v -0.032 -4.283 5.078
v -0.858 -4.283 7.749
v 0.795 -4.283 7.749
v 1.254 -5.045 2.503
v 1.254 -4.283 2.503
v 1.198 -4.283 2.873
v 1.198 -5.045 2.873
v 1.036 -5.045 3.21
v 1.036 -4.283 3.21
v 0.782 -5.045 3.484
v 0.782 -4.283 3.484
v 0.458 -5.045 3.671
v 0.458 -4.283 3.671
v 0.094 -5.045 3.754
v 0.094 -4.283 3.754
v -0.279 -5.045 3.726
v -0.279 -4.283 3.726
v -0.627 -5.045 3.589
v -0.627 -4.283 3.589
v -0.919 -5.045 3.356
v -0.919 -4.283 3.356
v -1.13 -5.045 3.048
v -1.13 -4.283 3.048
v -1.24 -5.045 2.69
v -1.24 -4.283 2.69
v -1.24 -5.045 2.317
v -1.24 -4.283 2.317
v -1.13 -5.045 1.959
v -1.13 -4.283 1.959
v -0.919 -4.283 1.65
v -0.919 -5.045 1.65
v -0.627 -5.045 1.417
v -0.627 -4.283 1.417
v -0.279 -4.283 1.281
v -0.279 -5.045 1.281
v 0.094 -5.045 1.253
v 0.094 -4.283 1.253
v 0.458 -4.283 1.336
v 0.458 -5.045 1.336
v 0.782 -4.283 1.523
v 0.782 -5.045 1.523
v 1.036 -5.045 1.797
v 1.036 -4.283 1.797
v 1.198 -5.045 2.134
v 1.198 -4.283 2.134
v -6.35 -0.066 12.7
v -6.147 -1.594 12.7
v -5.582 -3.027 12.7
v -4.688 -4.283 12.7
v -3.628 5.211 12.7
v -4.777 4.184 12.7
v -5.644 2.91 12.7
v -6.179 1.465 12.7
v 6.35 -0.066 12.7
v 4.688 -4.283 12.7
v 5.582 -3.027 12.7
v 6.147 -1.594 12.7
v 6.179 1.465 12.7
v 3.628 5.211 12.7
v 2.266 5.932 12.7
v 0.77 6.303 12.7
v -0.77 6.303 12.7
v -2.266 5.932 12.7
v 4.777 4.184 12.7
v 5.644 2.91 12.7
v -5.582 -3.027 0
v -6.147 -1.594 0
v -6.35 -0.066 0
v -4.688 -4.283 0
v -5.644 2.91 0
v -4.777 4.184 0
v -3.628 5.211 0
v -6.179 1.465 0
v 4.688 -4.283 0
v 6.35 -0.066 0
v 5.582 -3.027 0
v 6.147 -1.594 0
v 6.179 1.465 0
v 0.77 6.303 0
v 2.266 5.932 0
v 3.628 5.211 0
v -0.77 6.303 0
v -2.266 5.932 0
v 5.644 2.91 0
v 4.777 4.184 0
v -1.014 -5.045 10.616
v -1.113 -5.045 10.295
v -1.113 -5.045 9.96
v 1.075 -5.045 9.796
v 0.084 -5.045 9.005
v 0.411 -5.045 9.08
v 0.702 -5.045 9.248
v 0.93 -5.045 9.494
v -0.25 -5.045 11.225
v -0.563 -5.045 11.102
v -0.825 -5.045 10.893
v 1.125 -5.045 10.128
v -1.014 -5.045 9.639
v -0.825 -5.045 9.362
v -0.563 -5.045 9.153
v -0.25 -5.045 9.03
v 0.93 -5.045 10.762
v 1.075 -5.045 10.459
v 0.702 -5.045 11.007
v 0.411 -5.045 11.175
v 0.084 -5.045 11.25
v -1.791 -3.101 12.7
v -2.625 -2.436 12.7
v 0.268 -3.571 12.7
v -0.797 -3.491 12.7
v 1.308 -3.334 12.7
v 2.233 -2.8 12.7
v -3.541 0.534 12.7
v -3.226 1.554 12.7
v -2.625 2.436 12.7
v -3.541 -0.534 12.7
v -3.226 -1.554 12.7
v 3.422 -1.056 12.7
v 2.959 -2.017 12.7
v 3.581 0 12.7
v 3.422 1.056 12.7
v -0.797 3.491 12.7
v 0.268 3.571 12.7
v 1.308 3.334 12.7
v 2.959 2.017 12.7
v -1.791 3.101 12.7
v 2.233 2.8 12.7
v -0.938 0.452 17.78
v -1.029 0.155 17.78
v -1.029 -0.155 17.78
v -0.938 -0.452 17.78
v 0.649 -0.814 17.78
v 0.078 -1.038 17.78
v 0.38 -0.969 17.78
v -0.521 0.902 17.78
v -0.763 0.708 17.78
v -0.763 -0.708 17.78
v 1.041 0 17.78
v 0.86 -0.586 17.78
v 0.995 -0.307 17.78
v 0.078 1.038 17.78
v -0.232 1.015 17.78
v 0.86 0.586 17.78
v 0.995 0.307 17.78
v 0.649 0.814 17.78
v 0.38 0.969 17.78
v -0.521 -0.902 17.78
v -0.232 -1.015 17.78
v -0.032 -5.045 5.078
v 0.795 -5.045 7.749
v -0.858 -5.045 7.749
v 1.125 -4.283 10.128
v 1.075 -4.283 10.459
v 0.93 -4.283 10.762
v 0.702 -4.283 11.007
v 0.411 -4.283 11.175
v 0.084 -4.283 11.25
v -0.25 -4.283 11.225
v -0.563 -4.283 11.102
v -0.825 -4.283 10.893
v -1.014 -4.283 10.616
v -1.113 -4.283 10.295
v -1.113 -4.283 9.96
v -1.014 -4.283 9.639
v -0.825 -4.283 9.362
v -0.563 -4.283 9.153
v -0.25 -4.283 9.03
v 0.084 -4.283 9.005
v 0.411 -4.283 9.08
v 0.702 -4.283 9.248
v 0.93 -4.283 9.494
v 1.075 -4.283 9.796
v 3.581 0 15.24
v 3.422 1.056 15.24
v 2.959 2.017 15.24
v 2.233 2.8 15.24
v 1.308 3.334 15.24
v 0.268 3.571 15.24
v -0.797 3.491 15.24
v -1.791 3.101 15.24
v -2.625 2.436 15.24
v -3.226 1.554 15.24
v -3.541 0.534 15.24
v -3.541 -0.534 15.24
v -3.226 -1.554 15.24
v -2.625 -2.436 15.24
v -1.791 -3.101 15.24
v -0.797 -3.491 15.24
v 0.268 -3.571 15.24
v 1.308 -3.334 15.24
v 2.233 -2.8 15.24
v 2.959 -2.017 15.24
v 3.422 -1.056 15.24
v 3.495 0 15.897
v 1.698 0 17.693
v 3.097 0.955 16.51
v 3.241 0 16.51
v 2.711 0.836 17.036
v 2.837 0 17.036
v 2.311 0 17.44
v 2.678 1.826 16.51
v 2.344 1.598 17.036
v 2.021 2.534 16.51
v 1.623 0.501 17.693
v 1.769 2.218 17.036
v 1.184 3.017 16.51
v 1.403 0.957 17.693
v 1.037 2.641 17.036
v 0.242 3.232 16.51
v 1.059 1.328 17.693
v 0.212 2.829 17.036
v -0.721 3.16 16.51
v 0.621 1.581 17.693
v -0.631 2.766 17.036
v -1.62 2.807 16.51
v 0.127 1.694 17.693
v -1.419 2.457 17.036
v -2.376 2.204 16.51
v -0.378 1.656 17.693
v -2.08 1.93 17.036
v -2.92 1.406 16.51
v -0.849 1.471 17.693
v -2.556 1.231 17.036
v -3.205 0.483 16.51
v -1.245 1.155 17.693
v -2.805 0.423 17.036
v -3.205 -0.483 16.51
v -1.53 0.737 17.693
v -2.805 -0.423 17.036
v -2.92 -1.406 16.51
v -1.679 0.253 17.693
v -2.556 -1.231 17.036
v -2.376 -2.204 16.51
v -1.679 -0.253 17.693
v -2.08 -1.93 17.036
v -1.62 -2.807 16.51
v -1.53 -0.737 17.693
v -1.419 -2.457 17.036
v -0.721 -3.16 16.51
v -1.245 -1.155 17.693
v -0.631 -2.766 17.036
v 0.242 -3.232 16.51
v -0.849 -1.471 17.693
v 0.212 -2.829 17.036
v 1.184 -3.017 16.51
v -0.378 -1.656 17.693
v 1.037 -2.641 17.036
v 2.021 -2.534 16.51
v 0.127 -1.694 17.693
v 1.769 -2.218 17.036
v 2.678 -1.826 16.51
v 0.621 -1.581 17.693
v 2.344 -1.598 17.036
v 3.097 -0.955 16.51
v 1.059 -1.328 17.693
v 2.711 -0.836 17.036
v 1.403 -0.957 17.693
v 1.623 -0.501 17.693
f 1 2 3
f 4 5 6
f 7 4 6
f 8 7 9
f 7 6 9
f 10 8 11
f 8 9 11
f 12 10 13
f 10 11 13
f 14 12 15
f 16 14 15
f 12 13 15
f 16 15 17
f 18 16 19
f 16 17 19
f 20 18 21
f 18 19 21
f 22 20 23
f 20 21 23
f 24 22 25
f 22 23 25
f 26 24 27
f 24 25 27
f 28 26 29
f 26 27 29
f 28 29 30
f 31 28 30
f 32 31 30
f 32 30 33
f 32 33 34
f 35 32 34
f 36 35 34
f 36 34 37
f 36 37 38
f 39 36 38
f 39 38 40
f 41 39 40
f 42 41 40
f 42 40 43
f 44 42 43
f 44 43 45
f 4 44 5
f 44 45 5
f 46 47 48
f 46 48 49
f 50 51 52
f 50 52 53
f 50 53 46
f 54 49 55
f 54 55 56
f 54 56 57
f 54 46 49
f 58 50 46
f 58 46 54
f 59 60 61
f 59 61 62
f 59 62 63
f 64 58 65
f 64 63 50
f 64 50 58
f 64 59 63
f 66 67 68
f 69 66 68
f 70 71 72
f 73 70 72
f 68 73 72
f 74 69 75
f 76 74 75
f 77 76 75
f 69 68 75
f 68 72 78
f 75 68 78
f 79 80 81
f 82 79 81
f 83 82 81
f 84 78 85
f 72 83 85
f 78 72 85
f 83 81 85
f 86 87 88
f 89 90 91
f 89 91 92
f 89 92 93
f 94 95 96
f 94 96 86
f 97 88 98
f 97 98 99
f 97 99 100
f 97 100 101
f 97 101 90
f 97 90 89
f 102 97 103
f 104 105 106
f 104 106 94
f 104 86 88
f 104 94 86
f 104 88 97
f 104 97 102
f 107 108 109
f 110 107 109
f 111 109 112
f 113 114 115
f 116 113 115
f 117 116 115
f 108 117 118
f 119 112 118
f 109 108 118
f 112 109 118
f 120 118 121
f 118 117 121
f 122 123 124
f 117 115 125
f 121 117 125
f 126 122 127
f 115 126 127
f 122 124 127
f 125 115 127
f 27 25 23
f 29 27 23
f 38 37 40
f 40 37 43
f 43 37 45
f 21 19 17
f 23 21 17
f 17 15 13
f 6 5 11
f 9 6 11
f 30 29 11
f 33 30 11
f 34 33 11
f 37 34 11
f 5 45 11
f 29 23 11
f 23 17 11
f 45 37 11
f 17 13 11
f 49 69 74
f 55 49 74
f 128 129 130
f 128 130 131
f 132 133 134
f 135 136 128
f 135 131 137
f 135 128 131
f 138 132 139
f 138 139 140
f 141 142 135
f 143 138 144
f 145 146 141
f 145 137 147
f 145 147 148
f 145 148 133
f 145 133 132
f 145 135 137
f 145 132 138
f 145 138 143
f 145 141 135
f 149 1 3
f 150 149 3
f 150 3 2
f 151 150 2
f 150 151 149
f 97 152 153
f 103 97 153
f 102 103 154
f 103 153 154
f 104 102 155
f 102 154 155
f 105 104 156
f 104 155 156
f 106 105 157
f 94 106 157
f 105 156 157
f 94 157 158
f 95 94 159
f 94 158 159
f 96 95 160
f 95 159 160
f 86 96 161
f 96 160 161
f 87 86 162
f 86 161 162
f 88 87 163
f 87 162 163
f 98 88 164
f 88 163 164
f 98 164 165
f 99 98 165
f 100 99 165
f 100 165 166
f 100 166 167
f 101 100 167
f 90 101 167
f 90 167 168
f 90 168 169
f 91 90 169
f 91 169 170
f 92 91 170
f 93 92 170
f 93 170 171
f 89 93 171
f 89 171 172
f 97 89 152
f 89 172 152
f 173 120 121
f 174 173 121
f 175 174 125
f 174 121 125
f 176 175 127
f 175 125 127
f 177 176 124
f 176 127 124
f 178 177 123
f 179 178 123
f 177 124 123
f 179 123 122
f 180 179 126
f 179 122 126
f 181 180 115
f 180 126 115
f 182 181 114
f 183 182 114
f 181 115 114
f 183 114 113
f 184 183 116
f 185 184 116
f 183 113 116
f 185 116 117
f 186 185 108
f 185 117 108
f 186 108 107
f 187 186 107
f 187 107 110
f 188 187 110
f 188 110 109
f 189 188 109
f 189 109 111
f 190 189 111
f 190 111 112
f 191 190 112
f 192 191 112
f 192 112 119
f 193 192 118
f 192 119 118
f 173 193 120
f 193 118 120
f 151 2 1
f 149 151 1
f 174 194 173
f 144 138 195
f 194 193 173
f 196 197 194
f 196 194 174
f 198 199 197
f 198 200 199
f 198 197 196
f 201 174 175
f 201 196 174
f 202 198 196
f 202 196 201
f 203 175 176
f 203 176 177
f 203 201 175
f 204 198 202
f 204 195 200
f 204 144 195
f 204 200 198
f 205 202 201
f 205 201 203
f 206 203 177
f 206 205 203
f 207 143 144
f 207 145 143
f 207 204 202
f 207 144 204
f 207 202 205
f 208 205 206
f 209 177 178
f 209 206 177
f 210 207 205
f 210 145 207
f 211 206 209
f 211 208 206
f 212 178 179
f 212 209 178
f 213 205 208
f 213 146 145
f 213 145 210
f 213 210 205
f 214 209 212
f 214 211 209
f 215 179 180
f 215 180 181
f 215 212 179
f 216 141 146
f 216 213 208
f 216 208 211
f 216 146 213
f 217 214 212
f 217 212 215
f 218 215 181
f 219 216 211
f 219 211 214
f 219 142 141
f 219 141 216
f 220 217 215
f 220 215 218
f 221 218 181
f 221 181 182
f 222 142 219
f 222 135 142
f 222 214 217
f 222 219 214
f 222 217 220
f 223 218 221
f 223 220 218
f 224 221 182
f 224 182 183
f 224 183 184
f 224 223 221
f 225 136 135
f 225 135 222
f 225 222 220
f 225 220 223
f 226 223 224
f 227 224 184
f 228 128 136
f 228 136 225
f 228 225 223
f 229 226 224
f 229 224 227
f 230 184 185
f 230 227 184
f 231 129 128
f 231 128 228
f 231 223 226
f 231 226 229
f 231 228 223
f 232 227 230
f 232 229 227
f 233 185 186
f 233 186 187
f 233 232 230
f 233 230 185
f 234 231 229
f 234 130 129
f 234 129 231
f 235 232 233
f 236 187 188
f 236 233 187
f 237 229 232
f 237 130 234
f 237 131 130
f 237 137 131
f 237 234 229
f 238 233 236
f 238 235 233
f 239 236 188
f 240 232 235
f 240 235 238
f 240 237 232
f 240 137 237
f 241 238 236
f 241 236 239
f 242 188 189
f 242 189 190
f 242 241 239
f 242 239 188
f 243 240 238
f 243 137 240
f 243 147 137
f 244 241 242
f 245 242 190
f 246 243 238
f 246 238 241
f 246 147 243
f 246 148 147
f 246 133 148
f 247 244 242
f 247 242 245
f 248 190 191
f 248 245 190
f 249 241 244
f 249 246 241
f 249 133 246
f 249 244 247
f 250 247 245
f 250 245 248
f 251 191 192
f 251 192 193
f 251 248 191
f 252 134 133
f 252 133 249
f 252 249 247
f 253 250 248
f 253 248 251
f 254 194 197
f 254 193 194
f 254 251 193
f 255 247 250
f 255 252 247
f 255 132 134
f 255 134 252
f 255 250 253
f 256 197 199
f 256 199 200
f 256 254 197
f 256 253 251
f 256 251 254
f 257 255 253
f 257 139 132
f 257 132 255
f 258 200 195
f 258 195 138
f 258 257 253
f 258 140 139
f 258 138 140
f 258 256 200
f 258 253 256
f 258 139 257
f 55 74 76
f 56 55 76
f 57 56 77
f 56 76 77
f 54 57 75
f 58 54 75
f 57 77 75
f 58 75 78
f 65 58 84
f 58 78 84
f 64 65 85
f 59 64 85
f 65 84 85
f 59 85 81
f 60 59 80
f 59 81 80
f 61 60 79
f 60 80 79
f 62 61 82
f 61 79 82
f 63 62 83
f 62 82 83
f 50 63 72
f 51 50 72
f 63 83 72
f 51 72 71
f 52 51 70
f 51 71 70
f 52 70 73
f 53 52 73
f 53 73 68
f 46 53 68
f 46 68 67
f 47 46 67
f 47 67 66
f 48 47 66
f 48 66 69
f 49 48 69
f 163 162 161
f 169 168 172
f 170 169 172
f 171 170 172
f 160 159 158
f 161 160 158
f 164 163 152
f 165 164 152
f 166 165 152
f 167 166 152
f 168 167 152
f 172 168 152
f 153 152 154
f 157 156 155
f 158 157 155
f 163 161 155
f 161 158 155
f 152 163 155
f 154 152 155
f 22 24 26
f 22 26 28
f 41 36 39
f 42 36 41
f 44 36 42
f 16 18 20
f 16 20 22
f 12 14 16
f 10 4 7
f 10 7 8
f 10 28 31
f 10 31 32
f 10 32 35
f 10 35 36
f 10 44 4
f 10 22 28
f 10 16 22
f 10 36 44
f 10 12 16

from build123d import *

# Parameters (mm, degrees)
F1_DEPTH  = 12.7
F2_R      = 3.581061
F3_DEPTH  = 5.08
F4_R      = 2.54
F5_R      = 1.125385
F6_DEPTH  = 0.762
F7_R      = 1.253992
F8_DEPTH  = 0.762
F10_DEPTH = 0.762


with BuildPart() as f1:
    # F0 (on Top) → F1 (new body)
    with BuildSketch(Plane.XY):
        with BuildLine():
            Line((-4.688413, -4.282672), (4.688413, -4.282672))
            ThreePointArc((4.688413, -4.282672), (0, 6.35), (-4.688413, -4.282672))
        make_face()
    extrude(amount=F1_DEPTH)


with BuildPart() as f3:
    # F2 (on face) → F3 (new body)
    with BuildSketch(Plane.XY.offset(12.7)):
        Circle(F2_R)
    extrude(amount=F3_DEPTH)

    # F4
    f4_edges = [f3.edges().sort_by_distance(p)[0] for p in [
        (-3.581061, 0, 17.78),
    ]]
    fillet(f4_edges, radius=F4_R)


with BuildPart() as f6:
    # F5 (on face) → F6 (new body)
    with BuildSketch(Plane.XZ.offset(4.282672)):
        with Locations((0, 10.127603)):
            Circle(F5_R)
    extrude(amount=F6_DEPTH)


with BuildPart() as f8:
    # F7 (on face) → F8 (new body)
    with BuildSketch(Plane.XZ.offset(4.282672)):
        with Locations((0, 2.503417)):
            Circle(F7_R)
    extrude(amount=F8_DEPTH)


with BuildPart() as f10:
    # F9 (on face) → F10 (new body)
    with BuildSketch(Plane.XZ.offset(4.282672)):
        Polygon((0.794749, 7.748757), (-0.858327, 7.748757), (-0.031789, 5.078404), align=None)
    extrude(amount=F10_DEPTH)


solid = Compound([f1.part, f3.part, f6.part, f8.part, f10.part])
